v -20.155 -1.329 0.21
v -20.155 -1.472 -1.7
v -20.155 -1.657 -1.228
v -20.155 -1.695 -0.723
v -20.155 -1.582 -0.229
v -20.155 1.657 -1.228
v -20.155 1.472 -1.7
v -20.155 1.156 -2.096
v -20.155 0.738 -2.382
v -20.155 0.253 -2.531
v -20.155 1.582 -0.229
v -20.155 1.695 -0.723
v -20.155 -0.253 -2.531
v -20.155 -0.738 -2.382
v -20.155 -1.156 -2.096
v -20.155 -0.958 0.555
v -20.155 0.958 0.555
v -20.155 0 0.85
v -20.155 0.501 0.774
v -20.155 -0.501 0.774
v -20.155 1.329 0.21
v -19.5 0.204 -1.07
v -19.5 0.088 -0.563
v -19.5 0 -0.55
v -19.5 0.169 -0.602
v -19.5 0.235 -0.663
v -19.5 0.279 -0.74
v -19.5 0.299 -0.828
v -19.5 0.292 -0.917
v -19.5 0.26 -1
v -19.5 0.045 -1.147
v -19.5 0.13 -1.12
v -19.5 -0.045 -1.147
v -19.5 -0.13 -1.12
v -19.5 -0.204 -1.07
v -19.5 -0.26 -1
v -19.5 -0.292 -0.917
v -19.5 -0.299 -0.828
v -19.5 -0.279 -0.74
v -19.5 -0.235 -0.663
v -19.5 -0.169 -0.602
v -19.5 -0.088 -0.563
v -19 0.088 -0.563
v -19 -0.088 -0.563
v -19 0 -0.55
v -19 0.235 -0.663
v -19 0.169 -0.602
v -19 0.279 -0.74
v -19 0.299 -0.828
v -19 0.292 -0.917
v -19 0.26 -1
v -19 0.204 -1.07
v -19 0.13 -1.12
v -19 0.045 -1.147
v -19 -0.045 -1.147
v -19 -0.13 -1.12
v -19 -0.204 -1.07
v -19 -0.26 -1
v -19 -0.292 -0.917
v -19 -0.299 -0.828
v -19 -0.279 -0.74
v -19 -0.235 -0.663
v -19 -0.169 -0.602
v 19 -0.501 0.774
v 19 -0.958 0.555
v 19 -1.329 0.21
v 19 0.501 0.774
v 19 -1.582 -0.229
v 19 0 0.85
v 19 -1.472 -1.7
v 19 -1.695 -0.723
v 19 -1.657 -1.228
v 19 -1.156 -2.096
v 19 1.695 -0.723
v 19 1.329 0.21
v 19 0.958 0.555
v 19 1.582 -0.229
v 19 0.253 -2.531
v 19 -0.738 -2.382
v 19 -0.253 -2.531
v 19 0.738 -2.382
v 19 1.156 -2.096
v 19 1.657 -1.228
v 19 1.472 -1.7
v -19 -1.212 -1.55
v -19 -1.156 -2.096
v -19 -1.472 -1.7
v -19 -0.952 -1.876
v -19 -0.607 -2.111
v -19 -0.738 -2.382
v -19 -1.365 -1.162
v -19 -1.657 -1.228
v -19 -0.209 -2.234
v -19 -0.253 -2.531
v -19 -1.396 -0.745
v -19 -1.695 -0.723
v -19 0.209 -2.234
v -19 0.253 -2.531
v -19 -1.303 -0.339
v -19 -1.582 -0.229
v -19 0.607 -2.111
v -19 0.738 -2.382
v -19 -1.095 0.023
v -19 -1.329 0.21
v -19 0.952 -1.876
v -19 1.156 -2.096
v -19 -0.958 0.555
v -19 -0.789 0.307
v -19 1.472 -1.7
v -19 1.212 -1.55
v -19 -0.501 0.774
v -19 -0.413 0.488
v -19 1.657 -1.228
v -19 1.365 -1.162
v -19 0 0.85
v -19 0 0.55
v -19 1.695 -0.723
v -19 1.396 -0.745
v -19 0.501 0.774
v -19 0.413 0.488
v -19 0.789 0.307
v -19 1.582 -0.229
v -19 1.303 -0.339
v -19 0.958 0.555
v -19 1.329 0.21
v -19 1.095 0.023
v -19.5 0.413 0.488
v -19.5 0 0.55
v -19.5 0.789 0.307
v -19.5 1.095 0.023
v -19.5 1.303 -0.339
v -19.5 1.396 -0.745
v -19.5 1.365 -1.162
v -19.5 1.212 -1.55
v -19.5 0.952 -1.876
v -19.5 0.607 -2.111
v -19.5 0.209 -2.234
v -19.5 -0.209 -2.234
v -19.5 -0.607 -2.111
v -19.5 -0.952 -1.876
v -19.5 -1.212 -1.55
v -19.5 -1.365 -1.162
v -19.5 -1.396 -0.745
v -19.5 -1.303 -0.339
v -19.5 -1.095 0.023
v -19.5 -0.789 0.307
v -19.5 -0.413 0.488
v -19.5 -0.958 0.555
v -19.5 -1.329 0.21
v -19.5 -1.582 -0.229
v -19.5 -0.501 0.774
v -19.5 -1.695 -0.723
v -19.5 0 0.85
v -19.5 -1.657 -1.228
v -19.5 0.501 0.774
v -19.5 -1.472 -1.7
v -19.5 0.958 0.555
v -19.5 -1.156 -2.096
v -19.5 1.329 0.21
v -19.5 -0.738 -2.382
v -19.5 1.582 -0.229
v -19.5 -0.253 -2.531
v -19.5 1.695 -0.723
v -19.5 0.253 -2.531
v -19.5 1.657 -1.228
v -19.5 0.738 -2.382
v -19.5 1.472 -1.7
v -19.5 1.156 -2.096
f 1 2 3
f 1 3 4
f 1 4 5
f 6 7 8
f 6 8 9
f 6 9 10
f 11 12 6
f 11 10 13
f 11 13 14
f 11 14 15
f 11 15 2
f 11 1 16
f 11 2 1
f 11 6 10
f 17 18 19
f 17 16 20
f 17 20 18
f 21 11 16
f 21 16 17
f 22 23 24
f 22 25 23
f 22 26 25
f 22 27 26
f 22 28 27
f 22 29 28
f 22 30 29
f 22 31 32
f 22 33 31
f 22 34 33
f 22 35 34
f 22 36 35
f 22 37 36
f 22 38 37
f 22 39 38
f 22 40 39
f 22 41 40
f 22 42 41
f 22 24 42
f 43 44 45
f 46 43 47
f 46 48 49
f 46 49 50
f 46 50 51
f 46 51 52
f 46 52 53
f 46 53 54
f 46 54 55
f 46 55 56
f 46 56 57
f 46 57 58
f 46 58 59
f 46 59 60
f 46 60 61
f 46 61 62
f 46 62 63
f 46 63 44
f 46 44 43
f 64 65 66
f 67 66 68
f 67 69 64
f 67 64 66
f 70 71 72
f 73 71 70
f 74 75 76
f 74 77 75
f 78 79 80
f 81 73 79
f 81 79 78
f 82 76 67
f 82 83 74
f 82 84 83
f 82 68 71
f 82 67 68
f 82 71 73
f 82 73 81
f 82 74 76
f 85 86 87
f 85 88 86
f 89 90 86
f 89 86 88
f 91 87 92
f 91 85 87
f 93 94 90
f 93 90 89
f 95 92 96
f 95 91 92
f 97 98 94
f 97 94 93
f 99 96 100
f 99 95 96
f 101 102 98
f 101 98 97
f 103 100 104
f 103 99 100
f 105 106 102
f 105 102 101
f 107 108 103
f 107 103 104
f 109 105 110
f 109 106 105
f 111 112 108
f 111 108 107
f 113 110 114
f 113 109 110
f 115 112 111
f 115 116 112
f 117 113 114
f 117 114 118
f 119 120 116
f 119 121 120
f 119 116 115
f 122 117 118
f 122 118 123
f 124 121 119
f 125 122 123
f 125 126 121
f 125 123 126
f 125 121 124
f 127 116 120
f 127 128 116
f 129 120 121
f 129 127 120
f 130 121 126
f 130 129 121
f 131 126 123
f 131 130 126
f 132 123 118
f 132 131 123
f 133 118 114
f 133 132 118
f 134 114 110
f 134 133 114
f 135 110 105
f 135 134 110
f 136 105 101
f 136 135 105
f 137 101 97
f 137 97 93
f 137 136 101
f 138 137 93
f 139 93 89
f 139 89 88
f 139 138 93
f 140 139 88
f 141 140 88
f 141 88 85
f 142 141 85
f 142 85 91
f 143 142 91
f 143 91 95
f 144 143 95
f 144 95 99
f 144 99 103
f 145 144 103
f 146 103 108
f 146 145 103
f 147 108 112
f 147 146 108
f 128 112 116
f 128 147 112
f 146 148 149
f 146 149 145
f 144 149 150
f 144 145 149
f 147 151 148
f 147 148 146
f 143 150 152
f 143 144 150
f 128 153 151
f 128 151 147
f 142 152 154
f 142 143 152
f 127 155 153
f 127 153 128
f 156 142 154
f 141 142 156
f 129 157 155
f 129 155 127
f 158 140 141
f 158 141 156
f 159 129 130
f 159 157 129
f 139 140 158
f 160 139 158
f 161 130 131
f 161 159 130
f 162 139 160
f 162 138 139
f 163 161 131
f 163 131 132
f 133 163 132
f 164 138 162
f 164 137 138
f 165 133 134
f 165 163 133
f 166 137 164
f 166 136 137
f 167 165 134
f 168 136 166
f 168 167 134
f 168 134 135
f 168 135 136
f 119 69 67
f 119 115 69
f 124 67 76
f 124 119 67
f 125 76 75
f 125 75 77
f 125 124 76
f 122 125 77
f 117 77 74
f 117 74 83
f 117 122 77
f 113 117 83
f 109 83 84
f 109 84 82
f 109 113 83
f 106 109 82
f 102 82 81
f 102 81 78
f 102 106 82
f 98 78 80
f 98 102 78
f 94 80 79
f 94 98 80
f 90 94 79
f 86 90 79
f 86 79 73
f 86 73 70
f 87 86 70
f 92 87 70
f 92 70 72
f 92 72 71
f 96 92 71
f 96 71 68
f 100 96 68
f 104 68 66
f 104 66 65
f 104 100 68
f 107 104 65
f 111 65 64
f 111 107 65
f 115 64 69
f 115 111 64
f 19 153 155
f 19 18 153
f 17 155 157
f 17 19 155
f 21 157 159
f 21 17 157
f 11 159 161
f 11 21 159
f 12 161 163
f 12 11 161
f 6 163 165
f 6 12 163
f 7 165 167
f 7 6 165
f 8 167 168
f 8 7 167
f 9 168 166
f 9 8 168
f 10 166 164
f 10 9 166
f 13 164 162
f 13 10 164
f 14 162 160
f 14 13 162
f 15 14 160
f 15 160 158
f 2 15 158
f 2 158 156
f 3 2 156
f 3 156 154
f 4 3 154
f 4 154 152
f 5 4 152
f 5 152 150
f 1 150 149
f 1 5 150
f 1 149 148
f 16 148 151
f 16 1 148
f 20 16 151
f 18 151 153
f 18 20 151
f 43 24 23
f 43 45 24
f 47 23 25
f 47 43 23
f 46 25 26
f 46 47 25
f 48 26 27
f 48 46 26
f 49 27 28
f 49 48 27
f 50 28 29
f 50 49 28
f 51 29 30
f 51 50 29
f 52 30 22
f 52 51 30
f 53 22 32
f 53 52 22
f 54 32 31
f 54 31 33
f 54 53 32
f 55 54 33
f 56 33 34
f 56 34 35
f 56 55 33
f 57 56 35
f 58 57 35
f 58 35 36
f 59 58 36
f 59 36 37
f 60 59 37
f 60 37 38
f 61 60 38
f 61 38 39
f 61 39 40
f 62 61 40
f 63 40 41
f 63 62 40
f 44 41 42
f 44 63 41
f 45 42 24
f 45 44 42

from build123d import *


with BuildPart() as f1:
    # F0 (on Front) → F1 (revolve)
    with BuildSketch(Plane.XZ):
        Polygon((-19, -0.85), (19, -0.85), (19, 0.85), (-19, 0.85), (-19, 0.55), (-19, -0.55), align=None)
        Polygon((-19.5, -0.55), (-19, -0.55), (-19, 0.55), (-19.5, 0.55), (-19.5, 0.85), (-20.155381, 0.85), (-20.155381, -0.85), (-19.5, -0.85), align=None)
    revolve(axis=Axis((0, 0, -0.85), (-1, 0, 0)))


solid = f1.part
